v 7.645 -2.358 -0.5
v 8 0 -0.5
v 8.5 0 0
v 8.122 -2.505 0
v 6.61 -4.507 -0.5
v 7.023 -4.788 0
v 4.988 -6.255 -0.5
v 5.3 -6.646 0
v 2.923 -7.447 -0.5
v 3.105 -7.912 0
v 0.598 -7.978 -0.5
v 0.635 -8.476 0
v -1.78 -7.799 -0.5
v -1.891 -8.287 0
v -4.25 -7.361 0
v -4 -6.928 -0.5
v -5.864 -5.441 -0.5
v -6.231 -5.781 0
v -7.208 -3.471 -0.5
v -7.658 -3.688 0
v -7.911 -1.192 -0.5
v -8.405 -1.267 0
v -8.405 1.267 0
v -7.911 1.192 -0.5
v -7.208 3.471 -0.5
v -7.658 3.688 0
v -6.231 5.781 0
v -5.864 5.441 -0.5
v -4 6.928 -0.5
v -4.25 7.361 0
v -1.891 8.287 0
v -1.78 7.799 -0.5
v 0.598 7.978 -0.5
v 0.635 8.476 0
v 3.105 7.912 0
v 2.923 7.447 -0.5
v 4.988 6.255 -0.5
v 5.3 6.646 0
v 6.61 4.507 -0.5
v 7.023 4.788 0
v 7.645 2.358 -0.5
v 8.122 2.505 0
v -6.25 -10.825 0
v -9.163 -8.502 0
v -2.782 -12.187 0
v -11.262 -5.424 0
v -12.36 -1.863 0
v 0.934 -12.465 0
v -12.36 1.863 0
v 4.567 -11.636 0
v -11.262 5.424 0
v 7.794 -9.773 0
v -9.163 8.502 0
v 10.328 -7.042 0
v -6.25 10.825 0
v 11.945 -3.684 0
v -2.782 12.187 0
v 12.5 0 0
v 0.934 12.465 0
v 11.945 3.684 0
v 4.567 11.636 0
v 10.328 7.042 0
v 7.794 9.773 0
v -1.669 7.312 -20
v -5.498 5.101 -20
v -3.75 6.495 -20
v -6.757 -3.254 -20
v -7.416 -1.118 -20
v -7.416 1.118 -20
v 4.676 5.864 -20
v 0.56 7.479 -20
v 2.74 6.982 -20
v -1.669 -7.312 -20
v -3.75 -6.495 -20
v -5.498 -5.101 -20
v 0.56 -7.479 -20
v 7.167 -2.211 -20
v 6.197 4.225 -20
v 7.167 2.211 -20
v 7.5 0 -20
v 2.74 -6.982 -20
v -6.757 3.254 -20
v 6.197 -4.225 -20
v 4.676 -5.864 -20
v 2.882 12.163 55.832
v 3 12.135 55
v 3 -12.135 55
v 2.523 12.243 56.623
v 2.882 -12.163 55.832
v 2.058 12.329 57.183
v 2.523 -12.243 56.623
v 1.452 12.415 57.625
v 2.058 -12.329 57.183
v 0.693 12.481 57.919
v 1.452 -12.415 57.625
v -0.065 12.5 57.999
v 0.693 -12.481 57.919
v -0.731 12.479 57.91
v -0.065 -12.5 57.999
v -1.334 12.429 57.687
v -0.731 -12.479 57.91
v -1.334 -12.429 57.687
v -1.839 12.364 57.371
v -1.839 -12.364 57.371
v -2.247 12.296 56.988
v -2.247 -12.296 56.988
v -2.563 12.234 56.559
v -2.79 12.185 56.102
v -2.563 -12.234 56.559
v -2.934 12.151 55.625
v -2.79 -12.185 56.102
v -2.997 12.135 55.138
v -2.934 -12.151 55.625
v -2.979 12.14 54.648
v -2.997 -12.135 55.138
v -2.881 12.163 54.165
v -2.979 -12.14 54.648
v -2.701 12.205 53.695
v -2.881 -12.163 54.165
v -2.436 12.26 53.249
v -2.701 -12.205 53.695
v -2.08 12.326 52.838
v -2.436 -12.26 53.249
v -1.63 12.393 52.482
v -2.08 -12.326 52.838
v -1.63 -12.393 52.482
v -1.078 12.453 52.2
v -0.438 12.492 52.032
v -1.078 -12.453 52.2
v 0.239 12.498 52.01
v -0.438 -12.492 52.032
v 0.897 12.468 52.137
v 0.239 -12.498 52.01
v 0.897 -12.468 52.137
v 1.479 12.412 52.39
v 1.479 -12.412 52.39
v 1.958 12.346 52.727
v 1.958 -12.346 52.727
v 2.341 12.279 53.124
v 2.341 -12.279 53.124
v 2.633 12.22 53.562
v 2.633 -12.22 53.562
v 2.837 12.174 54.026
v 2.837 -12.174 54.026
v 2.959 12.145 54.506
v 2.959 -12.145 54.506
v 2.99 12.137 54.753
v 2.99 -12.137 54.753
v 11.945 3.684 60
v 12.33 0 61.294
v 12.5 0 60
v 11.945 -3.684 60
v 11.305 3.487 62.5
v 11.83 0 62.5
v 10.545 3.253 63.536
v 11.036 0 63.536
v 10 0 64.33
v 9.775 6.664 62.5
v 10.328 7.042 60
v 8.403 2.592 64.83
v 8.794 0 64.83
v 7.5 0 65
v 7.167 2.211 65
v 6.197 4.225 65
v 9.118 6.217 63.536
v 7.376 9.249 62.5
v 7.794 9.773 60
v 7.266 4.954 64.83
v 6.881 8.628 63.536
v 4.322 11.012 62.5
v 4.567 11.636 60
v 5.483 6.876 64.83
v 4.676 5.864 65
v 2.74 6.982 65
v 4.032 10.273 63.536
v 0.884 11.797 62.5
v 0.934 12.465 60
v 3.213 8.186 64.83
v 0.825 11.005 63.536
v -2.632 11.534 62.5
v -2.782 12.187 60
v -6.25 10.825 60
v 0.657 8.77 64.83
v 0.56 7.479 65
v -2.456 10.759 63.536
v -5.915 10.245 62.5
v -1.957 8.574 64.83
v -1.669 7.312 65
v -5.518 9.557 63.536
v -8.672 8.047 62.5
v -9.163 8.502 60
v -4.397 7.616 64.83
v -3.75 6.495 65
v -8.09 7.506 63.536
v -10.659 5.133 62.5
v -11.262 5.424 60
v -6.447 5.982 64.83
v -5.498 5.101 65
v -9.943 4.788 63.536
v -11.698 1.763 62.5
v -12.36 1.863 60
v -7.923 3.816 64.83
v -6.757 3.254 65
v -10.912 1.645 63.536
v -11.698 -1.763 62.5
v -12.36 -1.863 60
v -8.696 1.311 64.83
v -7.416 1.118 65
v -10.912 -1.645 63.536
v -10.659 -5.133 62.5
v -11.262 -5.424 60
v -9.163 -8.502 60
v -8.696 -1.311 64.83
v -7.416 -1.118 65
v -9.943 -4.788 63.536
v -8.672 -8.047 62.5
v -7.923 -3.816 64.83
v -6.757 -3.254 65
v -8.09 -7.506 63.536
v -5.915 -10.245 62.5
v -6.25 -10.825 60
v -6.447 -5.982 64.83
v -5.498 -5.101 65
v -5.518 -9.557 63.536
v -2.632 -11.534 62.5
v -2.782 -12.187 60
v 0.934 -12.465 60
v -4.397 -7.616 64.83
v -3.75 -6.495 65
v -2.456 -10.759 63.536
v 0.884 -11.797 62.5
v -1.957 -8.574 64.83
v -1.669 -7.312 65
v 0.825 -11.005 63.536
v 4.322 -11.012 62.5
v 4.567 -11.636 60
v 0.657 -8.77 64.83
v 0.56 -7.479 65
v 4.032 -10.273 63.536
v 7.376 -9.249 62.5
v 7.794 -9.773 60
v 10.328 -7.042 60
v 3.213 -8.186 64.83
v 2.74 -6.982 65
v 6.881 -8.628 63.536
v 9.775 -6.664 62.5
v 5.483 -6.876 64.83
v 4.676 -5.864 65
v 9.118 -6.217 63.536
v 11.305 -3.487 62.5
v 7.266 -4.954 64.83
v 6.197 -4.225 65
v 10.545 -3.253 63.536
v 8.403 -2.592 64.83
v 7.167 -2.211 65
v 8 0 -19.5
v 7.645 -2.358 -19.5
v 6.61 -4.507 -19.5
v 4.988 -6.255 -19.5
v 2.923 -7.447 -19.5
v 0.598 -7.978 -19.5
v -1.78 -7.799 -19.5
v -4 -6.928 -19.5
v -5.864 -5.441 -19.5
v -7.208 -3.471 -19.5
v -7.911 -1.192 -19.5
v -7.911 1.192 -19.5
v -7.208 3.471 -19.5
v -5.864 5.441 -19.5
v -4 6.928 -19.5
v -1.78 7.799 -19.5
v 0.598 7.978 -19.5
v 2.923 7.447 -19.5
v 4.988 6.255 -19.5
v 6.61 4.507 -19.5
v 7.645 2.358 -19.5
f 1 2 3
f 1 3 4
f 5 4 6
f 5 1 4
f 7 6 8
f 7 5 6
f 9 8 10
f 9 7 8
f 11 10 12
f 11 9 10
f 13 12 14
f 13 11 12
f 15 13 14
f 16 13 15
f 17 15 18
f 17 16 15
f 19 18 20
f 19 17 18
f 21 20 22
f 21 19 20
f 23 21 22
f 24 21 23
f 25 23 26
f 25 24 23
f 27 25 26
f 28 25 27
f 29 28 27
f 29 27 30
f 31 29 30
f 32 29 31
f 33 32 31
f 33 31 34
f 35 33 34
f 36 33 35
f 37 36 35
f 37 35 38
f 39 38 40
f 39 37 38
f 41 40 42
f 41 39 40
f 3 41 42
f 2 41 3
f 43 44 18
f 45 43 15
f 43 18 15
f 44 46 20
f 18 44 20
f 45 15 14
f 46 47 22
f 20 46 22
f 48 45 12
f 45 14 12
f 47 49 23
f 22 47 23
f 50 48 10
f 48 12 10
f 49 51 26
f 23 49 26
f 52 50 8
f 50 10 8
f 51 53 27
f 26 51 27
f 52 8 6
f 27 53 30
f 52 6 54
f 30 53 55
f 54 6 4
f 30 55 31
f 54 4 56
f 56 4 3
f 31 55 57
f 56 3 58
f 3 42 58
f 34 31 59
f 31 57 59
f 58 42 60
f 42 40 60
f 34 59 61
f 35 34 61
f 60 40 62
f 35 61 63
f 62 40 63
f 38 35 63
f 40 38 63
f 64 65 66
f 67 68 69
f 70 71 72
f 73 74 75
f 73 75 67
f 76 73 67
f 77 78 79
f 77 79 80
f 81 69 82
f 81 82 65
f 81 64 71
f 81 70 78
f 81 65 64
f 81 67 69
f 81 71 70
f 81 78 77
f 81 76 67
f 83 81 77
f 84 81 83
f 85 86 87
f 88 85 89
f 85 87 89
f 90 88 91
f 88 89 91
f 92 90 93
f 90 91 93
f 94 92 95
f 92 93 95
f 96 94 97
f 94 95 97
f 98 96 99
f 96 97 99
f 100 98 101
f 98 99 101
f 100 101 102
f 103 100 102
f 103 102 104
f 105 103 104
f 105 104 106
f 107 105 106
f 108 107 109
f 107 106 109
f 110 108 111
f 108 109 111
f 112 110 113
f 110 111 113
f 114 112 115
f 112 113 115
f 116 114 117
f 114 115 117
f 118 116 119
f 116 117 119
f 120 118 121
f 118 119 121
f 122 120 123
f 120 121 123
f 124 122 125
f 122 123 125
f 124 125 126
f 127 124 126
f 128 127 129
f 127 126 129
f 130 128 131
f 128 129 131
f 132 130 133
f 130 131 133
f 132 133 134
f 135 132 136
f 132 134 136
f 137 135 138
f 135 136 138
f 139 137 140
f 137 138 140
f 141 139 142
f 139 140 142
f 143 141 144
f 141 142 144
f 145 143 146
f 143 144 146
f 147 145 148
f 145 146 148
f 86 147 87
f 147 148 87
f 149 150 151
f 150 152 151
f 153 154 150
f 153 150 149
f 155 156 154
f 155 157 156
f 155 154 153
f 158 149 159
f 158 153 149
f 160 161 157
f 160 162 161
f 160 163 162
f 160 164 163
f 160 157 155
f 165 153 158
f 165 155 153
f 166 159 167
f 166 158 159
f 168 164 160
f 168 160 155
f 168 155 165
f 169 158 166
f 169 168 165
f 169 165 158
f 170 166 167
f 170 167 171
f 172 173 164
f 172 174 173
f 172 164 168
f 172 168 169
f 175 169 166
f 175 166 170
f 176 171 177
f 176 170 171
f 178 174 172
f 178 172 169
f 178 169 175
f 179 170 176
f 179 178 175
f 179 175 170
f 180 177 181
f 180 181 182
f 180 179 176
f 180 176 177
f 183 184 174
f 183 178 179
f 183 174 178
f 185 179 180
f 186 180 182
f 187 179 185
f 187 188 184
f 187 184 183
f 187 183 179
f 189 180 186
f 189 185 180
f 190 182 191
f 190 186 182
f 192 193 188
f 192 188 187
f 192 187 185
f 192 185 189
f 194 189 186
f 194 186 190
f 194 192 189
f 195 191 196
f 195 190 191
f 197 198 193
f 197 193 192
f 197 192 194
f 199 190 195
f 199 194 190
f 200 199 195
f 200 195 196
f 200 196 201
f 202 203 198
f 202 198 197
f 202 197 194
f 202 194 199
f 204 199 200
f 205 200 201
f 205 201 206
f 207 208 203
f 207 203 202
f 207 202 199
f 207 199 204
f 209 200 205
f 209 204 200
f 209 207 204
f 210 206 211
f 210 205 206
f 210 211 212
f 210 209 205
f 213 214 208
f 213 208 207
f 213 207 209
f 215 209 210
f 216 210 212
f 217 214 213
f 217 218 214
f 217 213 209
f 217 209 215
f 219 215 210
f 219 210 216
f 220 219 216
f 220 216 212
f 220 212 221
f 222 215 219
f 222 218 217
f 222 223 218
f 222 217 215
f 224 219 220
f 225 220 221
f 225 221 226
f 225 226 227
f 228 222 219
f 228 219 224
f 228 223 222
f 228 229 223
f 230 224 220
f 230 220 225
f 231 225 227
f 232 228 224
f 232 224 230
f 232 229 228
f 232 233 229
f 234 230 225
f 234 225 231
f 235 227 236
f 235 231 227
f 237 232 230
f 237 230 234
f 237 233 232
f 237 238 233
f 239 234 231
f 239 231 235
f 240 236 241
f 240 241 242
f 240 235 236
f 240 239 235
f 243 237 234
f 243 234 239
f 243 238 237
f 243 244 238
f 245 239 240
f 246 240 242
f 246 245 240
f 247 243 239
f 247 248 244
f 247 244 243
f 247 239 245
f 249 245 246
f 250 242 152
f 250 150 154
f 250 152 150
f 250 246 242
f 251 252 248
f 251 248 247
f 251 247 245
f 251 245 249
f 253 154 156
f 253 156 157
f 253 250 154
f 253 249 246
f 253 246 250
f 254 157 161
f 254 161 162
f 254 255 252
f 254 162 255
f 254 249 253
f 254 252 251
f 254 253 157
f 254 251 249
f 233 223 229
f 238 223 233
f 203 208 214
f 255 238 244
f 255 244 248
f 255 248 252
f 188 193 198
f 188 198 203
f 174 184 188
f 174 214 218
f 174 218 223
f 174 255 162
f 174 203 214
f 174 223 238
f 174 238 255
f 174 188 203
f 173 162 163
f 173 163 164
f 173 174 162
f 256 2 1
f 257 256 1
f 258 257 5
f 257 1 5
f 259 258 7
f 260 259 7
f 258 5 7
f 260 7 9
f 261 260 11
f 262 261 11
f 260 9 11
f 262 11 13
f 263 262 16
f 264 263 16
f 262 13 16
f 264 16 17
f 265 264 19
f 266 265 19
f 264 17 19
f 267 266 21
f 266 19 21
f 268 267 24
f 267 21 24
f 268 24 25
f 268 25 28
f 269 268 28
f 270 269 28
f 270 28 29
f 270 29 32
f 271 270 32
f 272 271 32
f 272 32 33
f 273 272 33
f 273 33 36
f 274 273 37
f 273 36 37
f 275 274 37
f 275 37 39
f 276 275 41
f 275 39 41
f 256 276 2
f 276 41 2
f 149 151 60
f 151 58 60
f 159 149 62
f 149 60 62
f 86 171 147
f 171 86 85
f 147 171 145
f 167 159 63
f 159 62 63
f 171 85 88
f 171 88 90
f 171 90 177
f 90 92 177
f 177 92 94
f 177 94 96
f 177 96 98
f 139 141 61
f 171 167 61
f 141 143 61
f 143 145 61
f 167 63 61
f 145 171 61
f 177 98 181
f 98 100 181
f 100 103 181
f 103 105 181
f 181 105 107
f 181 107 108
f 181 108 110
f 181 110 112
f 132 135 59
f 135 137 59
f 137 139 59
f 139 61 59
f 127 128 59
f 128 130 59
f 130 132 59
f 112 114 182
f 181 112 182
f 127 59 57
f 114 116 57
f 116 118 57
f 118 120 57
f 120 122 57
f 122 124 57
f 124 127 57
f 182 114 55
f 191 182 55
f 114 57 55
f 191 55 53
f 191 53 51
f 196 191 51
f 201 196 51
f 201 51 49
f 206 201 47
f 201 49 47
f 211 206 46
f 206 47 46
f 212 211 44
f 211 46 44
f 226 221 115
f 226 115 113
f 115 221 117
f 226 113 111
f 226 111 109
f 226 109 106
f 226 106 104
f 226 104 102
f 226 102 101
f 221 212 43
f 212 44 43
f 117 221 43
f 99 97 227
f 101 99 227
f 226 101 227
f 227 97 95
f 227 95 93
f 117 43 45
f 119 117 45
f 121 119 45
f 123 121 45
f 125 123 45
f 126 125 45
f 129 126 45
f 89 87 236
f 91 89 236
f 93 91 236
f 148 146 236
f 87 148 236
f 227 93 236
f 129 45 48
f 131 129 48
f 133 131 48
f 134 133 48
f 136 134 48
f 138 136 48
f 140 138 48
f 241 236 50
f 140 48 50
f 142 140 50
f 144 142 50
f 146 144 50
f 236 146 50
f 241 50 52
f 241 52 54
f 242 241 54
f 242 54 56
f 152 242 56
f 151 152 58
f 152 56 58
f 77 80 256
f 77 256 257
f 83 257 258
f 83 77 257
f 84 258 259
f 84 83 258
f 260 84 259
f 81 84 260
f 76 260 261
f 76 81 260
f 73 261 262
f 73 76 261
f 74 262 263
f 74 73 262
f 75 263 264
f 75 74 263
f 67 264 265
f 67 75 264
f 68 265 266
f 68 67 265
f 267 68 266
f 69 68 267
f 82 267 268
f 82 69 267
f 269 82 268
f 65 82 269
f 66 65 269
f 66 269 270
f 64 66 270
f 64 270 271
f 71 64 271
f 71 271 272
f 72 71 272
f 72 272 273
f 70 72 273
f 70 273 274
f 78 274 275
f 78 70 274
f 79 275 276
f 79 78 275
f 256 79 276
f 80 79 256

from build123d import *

# Parameters (mm, degrees)
F0_R     = 12.5
F1_DEPTH = 65
F2_R     = 5
F3_R     = 8
F4_DEPTH = 20
F5_SIZE  = 0.5
F6_R     = 3
F7_DEPTH = 20


with BuildPart() as f1:
    # F0 (on Top) → F1 (new body)
    with BuildSketch(Plane.XY):
        Circle(F0_R)
    extrude(amount=F1_DEPTH)

    # F2
    f2_edges = [f1.edges().sort_by_distance(p)[0] for p in [
        (-12.5, 0, 65),
    ]]
    fillet(f2_edges, radius=F2_R)

    # F3 (on face) → F4 (join)
    with BuildSketch(Plane(origin=(0, 0, 0), x_dir=(1, 0, 0), z_dir=(0, 0, -1))):
        Circle(F3_R)
    extrude(amount=F4_DEPTH)

    # F5
    f5_edges = [f1.edges().sort_by_distance(p)[0] for p in [
        (-8, 0, -20),
        (-8, 0, 0),
    ]]
    chamfer(f5_edges, length=F5_SIZE)

    # F6 (on Front) → F7 (cut, symmetric)
    with BuildSketch(Plane.XZ):
        with Locations((0, 55)):
            Circle(F6_R)
    extrude(amount=F7_DEPTH, both=True, mode=Mode.SUBTRACT)


solid = f1.part
